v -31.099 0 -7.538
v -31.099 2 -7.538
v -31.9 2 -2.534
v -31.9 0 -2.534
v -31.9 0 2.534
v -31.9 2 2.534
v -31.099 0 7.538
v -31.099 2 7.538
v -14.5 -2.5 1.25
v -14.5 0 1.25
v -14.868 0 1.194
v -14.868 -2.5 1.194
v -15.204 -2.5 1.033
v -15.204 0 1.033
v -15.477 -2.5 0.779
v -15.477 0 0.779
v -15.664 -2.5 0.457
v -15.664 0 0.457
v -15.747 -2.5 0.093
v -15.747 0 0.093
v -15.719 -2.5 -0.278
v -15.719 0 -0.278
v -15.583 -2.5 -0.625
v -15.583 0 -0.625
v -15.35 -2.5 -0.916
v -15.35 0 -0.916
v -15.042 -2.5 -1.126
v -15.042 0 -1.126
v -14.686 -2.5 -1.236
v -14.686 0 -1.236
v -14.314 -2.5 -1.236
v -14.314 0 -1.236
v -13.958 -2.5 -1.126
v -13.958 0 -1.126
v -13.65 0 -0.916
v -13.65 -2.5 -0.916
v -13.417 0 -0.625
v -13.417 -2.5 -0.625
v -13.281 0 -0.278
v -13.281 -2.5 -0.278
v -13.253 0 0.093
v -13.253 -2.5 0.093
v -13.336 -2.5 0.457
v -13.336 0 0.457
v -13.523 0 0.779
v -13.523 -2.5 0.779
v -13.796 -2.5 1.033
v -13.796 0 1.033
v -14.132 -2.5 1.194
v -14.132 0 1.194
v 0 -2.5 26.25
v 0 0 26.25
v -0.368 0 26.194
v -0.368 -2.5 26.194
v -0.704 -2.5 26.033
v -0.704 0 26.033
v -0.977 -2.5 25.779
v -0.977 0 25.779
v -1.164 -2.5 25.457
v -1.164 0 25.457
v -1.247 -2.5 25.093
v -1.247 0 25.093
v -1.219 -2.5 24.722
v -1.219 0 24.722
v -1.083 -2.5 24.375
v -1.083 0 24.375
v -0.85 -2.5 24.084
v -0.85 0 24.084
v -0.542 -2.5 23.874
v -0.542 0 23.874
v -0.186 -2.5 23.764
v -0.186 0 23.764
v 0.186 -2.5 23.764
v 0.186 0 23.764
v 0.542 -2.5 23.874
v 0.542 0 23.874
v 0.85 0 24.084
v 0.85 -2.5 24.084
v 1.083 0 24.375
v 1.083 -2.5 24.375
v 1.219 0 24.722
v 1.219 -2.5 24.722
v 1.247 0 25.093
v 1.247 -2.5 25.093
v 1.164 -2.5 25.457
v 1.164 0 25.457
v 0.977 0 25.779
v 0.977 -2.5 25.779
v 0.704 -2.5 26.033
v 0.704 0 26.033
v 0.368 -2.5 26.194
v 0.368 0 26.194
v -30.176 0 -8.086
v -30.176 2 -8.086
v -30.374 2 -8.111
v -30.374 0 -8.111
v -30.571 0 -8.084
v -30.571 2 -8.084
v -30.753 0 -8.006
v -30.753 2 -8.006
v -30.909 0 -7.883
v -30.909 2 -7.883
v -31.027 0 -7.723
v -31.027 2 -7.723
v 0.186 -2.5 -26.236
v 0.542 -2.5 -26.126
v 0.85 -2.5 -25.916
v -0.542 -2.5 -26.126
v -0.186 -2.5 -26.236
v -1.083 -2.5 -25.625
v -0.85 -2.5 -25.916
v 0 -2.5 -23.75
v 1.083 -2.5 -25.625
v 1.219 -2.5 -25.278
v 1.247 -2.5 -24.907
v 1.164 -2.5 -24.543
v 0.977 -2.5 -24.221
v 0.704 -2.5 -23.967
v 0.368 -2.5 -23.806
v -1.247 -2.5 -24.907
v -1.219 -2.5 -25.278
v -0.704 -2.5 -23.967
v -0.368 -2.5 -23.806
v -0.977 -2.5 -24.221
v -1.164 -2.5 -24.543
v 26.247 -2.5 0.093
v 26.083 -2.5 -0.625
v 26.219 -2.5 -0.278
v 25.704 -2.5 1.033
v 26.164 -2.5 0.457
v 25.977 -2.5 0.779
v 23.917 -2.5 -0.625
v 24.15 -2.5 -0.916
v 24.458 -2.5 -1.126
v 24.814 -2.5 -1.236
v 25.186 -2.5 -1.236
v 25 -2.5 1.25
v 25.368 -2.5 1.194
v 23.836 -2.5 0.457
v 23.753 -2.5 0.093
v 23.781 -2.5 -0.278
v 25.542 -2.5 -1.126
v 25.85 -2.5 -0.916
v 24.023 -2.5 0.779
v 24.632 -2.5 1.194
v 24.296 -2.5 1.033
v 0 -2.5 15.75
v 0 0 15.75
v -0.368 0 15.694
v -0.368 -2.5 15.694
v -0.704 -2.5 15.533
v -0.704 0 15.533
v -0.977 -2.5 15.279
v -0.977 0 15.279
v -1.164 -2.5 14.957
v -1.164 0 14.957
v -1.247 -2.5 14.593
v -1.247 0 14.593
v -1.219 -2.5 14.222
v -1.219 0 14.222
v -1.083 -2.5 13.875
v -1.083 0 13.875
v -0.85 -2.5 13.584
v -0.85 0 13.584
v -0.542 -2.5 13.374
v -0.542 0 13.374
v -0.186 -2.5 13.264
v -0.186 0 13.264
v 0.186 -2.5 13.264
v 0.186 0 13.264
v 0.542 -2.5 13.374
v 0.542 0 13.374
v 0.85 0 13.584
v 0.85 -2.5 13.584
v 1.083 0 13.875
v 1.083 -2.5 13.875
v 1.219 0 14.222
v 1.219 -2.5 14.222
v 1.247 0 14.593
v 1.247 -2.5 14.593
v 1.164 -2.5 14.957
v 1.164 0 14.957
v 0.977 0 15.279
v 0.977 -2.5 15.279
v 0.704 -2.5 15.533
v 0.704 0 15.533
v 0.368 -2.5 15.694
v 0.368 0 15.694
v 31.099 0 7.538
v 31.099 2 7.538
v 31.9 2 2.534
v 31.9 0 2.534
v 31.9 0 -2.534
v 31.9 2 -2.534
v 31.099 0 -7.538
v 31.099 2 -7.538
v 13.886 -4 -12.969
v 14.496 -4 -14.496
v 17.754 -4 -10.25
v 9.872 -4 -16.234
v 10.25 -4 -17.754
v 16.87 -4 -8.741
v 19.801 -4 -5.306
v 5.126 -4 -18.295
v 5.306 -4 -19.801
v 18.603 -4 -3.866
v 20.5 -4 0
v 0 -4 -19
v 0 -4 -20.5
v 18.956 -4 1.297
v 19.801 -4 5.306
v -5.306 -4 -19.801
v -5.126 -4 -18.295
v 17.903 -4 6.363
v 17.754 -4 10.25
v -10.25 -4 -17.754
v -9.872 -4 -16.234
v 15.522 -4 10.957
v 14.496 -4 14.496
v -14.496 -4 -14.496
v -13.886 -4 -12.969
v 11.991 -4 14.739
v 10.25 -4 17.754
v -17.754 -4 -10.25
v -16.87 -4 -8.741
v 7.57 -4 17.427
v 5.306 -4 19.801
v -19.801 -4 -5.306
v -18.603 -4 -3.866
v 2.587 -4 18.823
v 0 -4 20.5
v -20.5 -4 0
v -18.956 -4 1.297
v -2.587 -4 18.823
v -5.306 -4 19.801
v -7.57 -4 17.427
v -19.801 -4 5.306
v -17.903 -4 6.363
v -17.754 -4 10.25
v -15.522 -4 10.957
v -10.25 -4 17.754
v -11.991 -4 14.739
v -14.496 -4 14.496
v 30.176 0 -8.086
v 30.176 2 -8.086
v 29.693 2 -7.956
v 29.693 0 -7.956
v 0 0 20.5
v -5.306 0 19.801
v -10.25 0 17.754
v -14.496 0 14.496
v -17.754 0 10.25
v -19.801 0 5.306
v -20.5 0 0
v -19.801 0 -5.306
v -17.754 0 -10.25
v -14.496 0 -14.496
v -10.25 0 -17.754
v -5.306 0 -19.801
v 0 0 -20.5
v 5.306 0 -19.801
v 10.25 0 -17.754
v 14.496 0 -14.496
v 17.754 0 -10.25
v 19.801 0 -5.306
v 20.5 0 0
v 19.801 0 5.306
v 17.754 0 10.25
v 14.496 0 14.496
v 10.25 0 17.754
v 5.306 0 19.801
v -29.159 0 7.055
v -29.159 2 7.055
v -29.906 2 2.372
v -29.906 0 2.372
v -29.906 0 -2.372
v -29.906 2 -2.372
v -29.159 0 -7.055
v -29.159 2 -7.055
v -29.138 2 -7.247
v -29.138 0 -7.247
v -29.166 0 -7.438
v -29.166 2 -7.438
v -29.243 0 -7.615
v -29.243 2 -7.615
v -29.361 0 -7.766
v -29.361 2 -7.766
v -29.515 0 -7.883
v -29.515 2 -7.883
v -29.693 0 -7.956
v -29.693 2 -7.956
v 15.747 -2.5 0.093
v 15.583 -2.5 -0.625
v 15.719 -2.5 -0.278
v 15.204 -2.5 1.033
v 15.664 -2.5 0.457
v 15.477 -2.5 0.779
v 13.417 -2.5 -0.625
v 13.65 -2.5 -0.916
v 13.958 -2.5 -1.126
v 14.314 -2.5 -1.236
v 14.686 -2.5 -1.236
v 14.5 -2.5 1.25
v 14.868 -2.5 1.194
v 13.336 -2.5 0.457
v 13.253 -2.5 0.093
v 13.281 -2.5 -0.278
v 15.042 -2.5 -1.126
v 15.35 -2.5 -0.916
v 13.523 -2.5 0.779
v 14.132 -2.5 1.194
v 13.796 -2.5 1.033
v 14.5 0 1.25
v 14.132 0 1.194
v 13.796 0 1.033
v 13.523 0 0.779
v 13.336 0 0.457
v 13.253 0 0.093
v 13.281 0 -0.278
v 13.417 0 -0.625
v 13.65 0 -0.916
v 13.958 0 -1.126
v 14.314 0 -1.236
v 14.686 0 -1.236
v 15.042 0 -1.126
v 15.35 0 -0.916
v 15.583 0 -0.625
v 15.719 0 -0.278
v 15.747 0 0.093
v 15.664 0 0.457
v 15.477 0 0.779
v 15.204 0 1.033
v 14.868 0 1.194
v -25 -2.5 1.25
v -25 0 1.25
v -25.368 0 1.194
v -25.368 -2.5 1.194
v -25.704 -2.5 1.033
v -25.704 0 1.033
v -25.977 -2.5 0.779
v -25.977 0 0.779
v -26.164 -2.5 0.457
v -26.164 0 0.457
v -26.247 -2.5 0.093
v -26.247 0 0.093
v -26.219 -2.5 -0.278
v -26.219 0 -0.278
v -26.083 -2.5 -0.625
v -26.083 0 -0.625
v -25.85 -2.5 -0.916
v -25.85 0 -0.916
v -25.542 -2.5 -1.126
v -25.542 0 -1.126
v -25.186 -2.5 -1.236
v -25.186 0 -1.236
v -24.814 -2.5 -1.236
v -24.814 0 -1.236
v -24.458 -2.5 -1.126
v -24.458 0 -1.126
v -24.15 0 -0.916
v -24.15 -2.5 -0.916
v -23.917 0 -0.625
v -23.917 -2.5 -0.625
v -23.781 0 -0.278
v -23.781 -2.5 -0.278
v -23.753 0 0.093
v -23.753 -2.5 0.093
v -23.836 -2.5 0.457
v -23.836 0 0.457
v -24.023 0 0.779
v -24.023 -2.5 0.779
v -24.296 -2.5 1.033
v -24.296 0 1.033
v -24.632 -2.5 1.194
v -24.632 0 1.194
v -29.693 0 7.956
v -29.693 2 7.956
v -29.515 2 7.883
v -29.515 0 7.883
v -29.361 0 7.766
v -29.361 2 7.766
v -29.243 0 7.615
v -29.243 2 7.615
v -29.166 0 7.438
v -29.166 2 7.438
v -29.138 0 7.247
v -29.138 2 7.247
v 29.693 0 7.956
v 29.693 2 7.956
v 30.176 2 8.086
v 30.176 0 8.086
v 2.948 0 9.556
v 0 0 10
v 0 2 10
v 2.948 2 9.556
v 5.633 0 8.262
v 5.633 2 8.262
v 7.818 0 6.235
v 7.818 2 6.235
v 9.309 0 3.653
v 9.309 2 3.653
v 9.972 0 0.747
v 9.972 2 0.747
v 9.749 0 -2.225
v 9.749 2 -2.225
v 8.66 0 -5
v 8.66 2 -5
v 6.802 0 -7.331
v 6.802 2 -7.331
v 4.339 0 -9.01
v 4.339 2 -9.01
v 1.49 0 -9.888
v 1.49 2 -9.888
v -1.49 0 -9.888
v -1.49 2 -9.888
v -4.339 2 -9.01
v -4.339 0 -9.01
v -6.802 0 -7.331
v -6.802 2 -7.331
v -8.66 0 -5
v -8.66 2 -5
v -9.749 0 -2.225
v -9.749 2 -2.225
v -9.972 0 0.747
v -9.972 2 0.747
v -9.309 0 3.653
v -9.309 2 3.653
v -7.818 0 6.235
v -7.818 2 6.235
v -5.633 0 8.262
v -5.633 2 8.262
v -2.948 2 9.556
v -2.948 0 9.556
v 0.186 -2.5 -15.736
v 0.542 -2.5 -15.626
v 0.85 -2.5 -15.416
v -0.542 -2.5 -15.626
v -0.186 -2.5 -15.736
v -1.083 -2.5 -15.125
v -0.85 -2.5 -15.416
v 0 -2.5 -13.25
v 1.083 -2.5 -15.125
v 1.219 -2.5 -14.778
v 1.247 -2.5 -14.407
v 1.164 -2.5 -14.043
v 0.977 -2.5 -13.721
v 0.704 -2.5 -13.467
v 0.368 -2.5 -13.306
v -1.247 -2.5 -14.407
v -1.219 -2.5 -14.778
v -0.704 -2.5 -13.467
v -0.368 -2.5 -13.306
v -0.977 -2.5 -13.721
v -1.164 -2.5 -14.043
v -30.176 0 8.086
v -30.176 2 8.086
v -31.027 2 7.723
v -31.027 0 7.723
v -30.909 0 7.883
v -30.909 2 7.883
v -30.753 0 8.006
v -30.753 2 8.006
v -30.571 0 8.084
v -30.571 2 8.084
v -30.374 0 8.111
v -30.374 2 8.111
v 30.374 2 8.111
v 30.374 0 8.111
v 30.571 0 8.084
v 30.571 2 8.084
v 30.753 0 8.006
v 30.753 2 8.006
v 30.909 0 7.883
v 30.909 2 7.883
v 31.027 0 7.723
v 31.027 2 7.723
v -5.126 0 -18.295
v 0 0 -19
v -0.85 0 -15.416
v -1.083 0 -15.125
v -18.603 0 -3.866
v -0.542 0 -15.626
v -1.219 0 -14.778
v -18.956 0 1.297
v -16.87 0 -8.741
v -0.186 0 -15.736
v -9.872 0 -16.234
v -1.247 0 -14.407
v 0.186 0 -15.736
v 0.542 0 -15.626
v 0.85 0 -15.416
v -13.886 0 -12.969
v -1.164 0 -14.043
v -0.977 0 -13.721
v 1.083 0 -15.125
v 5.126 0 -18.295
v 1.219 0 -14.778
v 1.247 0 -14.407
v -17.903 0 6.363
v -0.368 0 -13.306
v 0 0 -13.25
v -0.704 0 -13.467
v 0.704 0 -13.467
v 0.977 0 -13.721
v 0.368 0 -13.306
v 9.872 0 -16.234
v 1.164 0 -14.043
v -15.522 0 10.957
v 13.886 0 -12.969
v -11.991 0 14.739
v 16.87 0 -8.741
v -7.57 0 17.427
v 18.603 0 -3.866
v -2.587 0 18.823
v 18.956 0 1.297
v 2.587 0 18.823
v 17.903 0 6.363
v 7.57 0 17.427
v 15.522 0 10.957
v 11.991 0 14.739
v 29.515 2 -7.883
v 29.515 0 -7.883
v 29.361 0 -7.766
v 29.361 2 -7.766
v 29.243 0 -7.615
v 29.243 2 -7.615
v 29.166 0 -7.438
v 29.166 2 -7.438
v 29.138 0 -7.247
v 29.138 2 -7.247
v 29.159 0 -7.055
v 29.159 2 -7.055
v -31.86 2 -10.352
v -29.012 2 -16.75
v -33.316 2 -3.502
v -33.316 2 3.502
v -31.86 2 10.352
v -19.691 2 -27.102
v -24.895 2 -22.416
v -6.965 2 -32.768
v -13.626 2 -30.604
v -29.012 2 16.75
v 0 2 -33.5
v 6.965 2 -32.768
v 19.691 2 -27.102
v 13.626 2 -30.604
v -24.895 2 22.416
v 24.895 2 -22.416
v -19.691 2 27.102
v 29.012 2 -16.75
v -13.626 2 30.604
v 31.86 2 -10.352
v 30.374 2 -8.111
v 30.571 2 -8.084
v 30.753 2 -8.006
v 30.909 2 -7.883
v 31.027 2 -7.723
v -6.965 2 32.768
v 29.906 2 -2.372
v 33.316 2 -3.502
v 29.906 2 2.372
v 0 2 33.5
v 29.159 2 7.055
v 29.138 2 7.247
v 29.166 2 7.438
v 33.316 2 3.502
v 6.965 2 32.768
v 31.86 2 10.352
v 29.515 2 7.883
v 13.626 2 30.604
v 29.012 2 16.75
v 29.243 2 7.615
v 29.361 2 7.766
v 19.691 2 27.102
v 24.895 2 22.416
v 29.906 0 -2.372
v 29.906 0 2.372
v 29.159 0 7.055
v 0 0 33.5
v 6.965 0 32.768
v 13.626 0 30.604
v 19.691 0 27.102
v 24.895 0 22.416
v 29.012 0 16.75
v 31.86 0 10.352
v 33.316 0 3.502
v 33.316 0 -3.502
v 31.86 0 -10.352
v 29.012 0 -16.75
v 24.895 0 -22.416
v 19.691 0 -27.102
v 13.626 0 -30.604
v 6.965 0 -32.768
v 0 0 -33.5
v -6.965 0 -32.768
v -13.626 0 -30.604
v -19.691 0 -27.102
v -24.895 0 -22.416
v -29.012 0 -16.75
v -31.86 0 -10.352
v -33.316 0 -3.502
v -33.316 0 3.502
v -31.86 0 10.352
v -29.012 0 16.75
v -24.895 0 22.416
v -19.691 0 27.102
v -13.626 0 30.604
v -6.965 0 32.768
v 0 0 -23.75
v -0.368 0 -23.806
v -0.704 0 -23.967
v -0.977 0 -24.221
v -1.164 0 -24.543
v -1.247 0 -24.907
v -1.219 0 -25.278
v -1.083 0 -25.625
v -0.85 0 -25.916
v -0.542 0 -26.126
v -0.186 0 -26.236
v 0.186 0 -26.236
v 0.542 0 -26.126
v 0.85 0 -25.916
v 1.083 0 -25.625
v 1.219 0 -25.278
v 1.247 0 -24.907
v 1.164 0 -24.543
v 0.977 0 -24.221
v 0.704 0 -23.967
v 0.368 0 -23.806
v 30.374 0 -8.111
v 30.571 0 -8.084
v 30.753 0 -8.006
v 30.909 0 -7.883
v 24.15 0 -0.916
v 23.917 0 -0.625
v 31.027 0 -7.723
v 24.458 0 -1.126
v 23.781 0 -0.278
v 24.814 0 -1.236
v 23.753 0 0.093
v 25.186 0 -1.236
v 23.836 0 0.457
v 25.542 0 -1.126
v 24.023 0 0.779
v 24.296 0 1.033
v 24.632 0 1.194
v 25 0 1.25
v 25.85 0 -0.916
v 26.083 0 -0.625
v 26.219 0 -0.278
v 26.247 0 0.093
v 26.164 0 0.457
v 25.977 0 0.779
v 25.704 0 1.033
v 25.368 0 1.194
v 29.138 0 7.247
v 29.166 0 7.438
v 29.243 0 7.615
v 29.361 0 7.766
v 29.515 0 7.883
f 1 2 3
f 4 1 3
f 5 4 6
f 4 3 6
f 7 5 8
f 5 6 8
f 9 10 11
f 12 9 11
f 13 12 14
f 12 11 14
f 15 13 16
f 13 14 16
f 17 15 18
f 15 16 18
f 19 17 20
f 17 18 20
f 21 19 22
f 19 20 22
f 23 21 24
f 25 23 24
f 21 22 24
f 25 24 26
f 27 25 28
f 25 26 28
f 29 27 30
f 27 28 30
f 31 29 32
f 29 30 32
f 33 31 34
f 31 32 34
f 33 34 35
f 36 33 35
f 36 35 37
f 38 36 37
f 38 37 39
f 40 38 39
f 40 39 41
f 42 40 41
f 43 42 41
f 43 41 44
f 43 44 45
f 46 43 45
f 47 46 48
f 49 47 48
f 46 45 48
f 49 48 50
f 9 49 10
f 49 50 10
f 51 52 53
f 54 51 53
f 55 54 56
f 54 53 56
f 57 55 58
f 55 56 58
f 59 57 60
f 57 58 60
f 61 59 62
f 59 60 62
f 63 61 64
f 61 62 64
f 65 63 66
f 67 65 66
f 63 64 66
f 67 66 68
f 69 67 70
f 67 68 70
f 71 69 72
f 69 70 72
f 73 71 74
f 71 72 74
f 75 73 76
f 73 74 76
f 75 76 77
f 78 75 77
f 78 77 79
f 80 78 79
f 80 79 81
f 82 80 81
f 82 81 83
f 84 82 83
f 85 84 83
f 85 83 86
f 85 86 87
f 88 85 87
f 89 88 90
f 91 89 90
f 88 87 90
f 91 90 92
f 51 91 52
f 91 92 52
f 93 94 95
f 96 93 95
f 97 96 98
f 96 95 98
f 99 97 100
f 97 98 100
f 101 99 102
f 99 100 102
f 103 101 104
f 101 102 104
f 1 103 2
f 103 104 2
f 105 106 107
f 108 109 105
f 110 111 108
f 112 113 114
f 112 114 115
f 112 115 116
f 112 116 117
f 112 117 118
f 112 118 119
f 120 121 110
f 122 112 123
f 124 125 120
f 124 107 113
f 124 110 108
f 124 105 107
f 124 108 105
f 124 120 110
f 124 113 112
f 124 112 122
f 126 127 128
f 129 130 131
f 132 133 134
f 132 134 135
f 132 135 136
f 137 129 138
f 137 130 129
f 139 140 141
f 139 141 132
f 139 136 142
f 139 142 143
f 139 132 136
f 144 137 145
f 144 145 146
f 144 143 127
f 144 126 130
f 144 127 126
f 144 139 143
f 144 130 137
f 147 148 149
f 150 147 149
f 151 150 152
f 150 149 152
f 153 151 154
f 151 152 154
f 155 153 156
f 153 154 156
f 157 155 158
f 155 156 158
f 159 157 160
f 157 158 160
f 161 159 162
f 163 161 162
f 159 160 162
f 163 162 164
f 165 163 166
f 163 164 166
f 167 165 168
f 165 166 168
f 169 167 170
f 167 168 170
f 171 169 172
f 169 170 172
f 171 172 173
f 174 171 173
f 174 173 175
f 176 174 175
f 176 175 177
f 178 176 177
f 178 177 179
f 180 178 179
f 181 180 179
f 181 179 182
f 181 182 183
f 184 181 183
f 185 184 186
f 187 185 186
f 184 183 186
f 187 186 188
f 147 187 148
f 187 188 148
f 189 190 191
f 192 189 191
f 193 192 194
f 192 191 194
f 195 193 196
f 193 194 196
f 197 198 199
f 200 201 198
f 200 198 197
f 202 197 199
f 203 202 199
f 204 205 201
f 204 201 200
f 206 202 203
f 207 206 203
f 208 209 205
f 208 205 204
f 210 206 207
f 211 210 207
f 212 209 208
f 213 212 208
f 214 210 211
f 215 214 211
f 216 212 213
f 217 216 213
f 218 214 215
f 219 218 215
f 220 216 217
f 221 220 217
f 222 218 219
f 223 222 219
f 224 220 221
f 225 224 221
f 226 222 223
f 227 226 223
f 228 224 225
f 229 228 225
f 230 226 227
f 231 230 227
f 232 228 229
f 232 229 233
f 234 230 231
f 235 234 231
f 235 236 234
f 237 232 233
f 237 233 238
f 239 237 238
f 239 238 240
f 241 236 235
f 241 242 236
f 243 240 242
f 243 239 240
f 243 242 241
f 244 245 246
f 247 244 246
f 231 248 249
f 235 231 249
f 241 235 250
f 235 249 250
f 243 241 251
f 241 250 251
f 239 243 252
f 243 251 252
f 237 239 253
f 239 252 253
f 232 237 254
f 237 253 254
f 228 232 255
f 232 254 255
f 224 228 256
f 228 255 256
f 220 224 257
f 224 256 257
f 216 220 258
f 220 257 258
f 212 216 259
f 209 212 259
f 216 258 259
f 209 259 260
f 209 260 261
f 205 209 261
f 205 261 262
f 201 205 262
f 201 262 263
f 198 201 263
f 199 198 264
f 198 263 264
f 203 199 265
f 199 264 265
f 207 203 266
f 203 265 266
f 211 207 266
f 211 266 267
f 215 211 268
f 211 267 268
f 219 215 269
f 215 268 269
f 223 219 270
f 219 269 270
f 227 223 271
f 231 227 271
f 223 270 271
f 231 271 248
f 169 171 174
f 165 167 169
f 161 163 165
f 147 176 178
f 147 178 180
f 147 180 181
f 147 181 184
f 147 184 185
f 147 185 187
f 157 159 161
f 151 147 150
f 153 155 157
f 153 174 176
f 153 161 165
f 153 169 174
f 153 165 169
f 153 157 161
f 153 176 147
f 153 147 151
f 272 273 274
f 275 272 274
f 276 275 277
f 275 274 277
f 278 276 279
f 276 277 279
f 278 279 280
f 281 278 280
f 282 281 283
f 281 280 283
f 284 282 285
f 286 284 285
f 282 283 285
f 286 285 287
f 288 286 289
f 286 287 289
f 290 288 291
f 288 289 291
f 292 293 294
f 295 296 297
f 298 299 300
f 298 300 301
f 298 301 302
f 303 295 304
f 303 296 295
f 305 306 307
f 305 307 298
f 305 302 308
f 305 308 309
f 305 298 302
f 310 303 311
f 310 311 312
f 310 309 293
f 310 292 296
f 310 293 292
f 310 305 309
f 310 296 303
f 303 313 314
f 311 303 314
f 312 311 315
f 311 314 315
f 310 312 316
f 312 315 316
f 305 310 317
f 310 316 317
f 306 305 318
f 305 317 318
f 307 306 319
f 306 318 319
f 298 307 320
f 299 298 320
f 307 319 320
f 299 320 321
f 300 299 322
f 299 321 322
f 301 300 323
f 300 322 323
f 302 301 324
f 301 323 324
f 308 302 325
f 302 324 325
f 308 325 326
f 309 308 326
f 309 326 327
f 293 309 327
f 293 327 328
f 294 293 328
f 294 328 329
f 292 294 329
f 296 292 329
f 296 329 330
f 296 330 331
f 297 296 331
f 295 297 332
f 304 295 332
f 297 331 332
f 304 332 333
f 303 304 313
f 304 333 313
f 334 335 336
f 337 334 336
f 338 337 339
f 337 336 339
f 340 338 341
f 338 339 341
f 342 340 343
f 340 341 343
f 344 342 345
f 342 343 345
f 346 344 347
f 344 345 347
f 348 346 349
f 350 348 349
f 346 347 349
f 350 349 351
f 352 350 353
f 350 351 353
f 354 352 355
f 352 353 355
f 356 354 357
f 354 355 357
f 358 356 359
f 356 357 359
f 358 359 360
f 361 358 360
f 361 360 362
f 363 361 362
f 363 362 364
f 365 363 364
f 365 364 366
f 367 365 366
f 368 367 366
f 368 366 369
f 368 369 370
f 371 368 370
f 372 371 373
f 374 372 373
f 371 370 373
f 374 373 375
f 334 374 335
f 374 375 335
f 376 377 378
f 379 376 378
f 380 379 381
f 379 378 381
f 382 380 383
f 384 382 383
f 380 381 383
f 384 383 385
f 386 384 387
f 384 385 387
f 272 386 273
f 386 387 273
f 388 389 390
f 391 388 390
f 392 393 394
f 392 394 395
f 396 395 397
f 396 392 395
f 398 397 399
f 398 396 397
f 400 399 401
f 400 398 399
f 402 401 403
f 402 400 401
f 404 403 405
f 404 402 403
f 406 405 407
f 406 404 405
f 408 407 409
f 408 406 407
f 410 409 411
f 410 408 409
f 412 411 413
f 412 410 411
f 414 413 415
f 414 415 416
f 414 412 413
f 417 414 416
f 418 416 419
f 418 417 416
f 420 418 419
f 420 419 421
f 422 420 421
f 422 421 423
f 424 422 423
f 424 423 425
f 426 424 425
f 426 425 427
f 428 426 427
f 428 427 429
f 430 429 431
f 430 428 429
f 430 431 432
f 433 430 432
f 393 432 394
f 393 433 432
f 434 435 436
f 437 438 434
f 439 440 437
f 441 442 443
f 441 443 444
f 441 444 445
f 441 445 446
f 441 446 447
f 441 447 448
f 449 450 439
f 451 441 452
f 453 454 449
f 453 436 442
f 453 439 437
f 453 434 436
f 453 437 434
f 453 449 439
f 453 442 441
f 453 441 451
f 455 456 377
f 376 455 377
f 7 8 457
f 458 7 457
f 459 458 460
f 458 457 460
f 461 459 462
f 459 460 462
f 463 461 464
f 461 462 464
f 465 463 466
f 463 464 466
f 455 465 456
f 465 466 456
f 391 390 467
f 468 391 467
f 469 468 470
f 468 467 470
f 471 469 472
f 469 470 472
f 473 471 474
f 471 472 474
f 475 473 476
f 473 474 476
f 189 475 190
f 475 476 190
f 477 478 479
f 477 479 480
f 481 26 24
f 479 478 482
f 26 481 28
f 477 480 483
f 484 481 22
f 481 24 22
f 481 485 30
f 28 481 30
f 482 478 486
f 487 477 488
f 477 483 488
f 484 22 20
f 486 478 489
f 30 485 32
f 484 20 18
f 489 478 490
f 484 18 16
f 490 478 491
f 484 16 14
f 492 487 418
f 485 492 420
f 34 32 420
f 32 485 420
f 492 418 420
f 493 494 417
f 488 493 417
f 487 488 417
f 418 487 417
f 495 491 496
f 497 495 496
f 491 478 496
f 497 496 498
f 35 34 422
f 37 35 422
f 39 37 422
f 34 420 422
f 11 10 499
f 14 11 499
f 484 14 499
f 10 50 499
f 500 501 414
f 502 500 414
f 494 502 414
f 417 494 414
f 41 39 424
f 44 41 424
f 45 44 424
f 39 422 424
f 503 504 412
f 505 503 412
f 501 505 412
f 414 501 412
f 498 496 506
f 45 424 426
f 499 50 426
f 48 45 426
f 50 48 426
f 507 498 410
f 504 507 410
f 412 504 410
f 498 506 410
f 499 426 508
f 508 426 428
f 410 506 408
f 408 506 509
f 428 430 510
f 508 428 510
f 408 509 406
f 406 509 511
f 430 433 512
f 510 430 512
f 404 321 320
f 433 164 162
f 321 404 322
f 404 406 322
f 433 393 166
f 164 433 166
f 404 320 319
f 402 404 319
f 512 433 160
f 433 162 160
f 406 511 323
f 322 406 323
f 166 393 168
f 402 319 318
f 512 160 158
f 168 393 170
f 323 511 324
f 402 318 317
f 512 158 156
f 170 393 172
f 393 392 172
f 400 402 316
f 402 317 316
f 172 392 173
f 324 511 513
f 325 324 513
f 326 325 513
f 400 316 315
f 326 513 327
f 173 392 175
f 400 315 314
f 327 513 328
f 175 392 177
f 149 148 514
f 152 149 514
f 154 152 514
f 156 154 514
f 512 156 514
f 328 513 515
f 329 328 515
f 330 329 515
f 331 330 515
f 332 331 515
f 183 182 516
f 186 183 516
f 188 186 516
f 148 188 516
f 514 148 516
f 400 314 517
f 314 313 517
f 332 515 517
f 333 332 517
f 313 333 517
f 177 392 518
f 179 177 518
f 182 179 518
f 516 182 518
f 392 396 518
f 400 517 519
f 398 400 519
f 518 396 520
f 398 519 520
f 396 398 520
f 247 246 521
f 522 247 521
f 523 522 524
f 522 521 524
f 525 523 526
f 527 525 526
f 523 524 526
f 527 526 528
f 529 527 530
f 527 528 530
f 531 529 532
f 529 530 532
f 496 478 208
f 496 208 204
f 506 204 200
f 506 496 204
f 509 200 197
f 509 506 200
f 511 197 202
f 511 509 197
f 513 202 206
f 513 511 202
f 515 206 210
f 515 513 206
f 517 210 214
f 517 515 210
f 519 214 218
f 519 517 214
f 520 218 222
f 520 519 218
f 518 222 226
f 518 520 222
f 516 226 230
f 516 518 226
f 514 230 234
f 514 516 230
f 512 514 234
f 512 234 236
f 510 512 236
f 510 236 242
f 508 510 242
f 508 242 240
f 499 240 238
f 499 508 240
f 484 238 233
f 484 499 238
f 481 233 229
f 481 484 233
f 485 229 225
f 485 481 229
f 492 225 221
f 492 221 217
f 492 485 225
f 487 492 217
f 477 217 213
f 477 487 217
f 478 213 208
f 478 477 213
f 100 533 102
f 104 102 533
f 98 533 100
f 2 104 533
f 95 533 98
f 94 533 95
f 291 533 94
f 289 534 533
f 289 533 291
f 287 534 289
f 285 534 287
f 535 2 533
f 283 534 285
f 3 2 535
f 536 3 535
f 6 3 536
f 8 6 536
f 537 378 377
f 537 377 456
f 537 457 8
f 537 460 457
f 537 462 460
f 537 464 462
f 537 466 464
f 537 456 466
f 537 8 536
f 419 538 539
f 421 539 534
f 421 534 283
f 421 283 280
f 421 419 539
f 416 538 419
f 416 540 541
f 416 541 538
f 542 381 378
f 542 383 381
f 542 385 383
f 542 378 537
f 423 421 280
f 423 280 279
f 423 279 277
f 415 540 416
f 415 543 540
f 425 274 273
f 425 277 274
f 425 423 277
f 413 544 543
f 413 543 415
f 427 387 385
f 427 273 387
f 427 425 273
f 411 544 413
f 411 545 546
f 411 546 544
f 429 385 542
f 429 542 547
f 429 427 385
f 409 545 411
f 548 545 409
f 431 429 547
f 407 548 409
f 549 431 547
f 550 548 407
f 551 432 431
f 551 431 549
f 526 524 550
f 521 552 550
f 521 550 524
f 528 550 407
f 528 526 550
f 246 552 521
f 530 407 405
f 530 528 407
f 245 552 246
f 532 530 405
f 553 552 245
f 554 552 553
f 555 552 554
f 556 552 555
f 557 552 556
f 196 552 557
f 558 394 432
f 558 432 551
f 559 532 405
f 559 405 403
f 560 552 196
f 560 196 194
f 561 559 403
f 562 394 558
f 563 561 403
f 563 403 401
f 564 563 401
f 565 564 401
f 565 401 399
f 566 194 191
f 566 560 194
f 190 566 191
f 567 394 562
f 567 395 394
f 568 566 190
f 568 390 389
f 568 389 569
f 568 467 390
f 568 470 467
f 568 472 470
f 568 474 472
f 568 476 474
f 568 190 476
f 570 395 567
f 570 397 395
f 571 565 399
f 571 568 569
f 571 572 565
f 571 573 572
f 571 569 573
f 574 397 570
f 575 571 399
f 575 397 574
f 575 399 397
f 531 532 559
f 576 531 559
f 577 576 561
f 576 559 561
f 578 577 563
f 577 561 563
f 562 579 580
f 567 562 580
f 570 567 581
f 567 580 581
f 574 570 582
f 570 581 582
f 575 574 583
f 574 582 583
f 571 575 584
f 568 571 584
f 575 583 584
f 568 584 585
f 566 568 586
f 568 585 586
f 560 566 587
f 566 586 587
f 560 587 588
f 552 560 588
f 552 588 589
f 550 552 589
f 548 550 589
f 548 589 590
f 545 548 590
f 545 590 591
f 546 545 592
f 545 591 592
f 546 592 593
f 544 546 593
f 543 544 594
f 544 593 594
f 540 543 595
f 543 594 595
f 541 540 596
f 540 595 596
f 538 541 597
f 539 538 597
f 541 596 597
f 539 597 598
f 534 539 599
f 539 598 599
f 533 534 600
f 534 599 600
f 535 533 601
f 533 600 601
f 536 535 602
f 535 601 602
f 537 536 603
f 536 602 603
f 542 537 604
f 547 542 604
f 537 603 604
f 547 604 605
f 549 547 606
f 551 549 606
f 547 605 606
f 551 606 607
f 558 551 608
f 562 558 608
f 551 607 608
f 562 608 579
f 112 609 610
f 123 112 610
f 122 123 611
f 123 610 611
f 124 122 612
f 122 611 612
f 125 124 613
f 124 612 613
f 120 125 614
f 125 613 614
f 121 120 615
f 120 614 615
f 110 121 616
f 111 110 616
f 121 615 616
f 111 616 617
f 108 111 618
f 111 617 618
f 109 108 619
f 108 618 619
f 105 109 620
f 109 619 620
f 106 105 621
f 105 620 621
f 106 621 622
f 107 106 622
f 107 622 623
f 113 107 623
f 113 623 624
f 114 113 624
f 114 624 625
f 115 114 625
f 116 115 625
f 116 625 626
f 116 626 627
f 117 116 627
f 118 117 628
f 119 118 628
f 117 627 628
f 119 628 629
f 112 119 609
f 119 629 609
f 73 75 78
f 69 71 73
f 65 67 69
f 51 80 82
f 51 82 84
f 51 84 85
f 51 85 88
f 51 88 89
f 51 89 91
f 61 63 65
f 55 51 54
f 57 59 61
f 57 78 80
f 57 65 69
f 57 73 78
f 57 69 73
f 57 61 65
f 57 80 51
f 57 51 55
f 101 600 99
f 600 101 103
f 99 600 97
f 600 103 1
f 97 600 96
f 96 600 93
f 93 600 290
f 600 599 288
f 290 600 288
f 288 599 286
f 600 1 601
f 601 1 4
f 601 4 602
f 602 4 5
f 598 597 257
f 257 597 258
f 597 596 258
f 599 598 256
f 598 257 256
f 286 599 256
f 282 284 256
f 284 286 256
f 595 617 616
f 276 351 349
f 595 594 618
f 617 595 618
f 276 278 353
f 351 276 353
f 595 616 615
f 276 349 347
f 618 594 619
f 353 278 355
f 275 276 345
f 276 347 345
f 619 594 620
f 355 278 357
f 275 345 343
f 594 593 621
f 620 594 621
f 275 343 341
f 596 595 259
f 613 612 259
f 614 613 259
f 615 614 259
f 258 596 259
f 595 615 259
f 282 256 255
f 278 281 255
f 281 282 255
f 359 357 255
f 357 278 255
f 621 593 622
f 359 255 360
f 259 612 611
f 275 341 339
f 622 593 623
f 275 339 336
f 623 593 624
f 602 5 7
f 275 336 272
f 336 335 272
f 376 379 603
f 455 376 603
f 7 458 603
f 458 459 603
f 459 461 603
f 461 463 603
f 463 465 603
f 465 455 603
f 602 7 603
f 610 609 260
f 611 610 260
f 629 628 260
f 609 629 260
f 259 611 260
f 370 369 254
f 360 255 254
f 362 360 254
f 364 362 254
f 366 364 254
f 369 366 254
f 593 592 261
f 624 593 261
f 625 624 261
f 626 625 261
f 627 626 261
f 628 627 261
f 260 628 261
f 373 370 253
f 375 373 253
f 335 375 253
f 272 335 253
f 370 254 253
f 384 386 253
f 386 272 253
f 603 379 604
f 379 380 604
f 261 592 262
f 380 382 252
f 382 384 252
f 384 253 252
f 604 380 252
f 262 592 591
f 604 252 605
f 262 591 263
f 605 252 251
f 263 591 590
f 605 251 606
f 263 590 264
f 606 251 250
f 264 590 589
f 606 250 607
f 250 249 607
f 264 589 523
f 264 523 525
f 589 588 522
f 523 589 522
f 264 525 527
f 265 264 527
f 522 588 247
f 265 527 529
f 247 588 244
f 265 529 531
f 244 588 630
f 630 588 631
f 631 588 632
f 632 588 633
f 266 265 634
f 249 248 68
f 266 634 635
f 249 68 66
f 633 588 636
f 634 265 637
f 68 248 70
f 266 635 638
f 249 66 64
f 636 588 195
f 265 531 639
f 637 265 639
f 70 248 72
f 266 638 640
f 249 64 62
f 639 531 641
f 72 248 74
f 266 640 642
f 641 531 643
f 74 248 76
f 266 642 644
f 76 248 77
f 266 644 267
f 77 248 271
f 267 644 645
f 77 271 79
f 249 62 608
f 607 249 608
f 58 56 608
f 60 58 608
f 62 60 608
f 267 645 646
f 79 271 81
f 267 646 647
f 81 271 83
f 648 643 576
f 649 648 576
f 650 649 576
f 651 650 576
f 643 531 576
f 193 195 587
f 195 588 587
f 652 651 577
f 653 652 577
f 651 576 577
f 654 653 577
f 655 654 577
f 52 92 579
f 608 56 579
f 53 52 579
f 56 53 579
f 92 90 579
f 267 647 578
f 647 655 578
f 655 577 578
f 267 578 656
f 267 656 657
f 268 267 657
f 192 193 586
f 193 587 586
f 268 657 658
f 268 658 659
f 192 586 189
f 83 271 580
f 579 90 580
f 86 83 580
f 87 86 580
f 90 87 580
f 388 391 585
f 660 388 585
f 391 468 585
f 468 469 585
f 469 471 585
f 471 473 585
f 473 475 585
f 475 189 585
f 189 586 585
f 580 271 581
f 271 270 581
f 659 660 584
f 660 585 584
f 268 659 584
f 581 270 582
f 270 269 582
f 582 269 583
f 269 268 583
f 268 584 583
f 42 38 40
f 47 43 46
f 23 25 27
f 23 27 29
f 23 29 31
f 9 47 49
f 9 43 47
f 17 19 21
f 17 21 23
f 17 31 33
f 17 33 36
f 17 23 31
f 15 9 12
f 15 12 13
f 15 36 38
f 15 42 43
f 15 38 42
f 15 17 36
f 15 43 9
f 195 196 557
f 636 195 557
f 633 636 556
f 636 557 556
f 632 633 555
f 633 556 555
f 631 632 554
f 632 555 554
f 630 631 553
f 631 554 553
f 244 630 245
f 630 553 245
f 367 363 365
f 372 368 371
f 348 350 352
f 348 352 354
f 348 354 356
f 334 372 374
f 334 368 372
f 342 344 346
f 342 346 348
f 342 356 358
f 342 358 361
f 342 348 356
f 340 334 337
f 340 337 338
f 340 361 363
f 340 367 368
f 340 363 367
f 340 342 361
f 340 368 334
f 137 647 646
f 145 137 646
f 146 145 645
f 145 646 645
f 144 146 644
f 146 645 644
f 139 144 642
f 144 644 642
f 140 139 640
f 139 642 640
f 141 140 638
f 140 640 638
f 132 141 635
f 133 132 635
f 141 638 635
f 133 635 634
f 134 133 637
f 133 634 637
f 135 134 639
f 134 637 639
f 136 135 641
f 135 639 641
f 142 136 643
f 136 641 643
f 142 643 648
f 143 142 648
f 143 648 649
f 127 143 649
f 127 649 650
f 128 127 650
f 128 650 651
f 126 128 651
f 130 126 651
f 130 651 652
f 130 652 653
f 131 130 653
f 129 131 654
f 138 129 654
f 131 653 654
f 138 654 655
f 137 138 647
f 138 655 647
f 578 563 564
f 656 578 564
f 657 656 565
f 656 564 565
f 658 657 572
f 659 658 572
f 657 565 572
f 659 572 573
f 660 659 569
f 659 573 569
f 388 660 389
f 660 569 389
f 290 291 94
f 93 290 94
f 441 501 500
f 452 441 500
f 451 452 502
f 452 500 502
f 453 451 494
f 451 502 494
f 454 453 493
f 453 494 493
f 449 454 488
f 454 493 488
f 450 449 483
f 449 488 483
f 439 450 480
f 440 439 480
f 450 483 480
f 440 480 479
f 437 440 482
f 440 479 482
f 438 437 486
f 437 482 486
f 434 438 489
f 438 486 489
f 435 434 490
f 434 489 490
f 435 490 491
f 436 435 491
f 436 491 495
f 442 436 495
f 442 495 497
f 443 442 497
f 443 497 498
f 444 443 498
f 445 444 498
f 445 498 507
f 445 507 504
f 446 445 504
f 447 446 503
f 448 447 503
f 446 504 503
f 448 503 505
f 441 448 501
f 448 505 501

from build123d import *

# Parameters (mm, degrees)
SKETCH_1_R          = 33.5
SKETCH_1_R_2        = 10
EXTRUDE_1_DEPTH     = 2
SKETCH_2_R          = 1.25
EXTRUDE_2_DEPTH     = 2.5
CUT_EXTRUDE_1_DEPTH = 2
SKETCH_4_R          = 20.5
SKETCH_4_R_2        = 19
EXTRUDE_3_DEPTH     = 4
SKETCH_5_R          = 1.25
EXTRUDE_4_DEPTH     = 2.5


with BuildPart() as part:
    # Эскиз1 → Бобышка-Вытянуть1 (new body)
    with BuildSketch(Plane(origin=(0, 0, 0), x_dir=(1, 0, 0), z_dir=(0, 1, 0))):
        with Locations(Location((0, 0, 0), (0, 0, 270))):
            Circle(SKETCH_1_R)
        with Locations(Location((0, 0, 0), (0, 0, 270))):
            Circle(SKETCH_1_R_2, mode=Mode.SUBTRACT)
    extrude(amount=EXTRUDE_1_DEPTH)

    # Эскиз2 → Бобышка-Вытянуть2 (add)
    with BuildSketch(Plane.XZ):
        with Locations(Location((0, 25, 0), (0, 0, 90))):
            Circle(SKETCH_2_R)
        with Locations(Location((-25, 0, 0), (0, 0, 90))):
            Circle(SKETCH_2_R)
        with Locations(Location((25, 0, 0), (0, 0, 90))):
            Circle(SKETCH_2_R)
        with Locations(Location((0, -25, 0), (0, 0, 90))):
            Circle(SKETCH_2_R)
    extrude(amount=EXTRUDE_2_DEPTH)

    # Эскиз3 → Вырез-Вытянуть1 (cut)
    with BuildSketch(Plane(origin=(0, 2, 0), x_dir=(1, 0, 0), z_dir=(0, 1, 0))):
        with BuildLine():
            Line((-29.693383157, 7.956318037), (-30.176487487, 8.085765453))
            ThreePointArc((-30.176487487, 8.085765453), (-30.753369556, 8.006293038), (-31.099496213, 7.537992789))
            ThreePointArc((-31.099496213, 7.537992789), (-32, 0), (-31.099496213, -7.537992789))
            ThreePointArc((-31.099496213, -7.537992789), (-30.753369556, -8.006293038), (-30.176487487, -8.085765453))
            Line((-30.176487487, -8.085765453), (-29.693383157, -7.956318037))
            ThreePointArc((-29.693383157, -7.956318037), (-29.242600206, -7.614767331), (-29.158534088, -7.055486505))
            ThreePointArc((-29.158534088, -7.055486505), (-30, 0), (-29.158534088, 7.055486505))
            ThreePointArc((-29.158534088, 7.055486505), (-29.242600206, 7.614767331), (-29.693383157, 7.956318037))
        make_face()
        with BuildLine():
            Line((29.693383157, -7.956318037), (30.176487487, -8.085765453))
            ThreePointArc((30.176487487, -8.085765453), (30.753369556, -8.006293038), (31.099496213, -7.537992789))
            ThreePointArc((31.099496213, -7.537992789), (32, 0), (31.099496213, 7.537992789))
            ThreePointArc((31.099496213, 7.537992789), (30.753369556, 8.006293038), (30.176487487, 8.085765453))
            Line((30.176487487, 8.085765453), (29.693383157, 7.956318037))
            ThreePointArc((29.693383157, 7.956318037), (29.242600206, 7.614767331), (29.158534088, 7.055486505))
            ThreePointArc((29.158534088, 7.055486505), (30, 0), (29.158534088, -7.055486505))
            ThreePointArc((29.158534088, -7.055486505), (29.242600206, -7.614767331), (29.693383157, -7.956318037))
        make_face()
    extrude(amount=-CUT_EXTRUDE_1_DEPTH, mode=Mode.SUBTRACT)

    # Эскиз4 → Бобышка-Вытянуть3 (add)
    with BuildSketch(Plane.XZ):
        with Locations(Location((0, 0, 0), (0, 0, 90))):
            Circle(SKETCH_4_R)
        with Locations(Location((0, 0, 0), (0, 0, 270))):
            Circle(SKETCH_4_R_2, mode=Mode.SUBTRACT)
    extrude(amount=EXTRUDE_3_DEPTH)

    # Эскиз5 → Бобышка-Вытянуть4 (add)
    with BuildSketch(Plane.XZ):
        with Locations(Location((0, 14.5, 0), (0, 0, 90))):
            Circle(SKETCH_5_R)
        with Locations(Location((14.5, 0, 0), (0, 0, 90))):
            Circle(SKETCH_5_R)
        with Locations(Location((0, -14.5, 0), (0, 0, 90))):
            Circle(SKETCH_5_R)
        with Locations(Location((-14.5, 0, 0), (0, 0, 90))):
            Circle(SKETCH_5_R)
    extrude(amount=EXTRUDE_4_DEPTH)


solid = part.part
